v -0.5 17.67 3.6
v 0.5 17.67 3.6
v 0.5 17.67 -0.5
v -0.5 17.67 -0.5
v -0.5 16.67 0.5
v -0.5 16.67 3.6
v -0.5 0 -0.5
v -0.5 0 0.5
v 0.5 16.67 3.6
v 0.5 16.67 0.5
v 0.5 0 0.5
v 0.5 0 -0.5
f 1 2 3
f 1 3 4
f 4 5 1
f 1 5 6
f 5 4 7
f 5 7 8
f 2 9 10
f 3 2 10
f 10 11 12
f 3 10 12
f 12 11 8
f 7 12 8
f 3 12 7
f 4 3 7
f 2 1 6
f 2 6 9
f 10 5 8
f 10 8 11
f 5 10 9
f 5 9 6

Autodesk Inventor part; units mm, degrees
ref_plane "YZ Plane" through (0, 0, 0) normal (1, 0, 0) x (0, 1, 0)
ref_plane "XZ Plane" through (0, 0, 0) normal (0, 1, 0) x (-1, 0, 0)
ref_plane "XY Plane" through (0, 0, 0) normal (0, 0, 1) x (1, 0, 0)
sketch "Sketch4" plane through (0, 0, 0) normal (0, 1, 0) x (-1, 0, 0)
  line L0 (0.5, 0.5) -> (-0.5, 0.5)
  line L1 (-0.5, 0.5) -> (-0.5, -0.5)
  line L2 (-0.5, -0.5) -> (0.5, -0.5)
  line L3 (0.5, -0.5) -> (0.5, 0.5)
  line L4 (0.5, 0.5) -> (-0.5, -0.5) construction
  line L5 (-0.5, 0.5) -> (0.5, -0.5) construction
  point P0 (0, 0)
  dimension "d13" = 1
  dimension "d14" = 1
extrude "Extrusion4" add sketch "Sketch4" along normal blind 17.67
sketch "Sketch5" plane through (-0.5, 0, 0.5) normal (0, 0, 1) x (1, 0, 0)
  line L0 (1, 17.67) -> (0, 17.67) projected
  line L1 (1, 0) -> (1, 17.67) projected
  line L2 (0, 17.67) -> (1, 17.67)
  line L3 (1, 17.67) -> (1, 16.67)
  line L4 (1, 16.67) -> (0, 16.67)
  line L5 (0, 16.67) -> (0, 17.67)
  point P0 (0.5, 0)
  dimension "d17" = 1
extrude "Extrusion5" add sketch "Sketch5" along normal blind 3.1
properties part number "jst-vh-2p_wire"
